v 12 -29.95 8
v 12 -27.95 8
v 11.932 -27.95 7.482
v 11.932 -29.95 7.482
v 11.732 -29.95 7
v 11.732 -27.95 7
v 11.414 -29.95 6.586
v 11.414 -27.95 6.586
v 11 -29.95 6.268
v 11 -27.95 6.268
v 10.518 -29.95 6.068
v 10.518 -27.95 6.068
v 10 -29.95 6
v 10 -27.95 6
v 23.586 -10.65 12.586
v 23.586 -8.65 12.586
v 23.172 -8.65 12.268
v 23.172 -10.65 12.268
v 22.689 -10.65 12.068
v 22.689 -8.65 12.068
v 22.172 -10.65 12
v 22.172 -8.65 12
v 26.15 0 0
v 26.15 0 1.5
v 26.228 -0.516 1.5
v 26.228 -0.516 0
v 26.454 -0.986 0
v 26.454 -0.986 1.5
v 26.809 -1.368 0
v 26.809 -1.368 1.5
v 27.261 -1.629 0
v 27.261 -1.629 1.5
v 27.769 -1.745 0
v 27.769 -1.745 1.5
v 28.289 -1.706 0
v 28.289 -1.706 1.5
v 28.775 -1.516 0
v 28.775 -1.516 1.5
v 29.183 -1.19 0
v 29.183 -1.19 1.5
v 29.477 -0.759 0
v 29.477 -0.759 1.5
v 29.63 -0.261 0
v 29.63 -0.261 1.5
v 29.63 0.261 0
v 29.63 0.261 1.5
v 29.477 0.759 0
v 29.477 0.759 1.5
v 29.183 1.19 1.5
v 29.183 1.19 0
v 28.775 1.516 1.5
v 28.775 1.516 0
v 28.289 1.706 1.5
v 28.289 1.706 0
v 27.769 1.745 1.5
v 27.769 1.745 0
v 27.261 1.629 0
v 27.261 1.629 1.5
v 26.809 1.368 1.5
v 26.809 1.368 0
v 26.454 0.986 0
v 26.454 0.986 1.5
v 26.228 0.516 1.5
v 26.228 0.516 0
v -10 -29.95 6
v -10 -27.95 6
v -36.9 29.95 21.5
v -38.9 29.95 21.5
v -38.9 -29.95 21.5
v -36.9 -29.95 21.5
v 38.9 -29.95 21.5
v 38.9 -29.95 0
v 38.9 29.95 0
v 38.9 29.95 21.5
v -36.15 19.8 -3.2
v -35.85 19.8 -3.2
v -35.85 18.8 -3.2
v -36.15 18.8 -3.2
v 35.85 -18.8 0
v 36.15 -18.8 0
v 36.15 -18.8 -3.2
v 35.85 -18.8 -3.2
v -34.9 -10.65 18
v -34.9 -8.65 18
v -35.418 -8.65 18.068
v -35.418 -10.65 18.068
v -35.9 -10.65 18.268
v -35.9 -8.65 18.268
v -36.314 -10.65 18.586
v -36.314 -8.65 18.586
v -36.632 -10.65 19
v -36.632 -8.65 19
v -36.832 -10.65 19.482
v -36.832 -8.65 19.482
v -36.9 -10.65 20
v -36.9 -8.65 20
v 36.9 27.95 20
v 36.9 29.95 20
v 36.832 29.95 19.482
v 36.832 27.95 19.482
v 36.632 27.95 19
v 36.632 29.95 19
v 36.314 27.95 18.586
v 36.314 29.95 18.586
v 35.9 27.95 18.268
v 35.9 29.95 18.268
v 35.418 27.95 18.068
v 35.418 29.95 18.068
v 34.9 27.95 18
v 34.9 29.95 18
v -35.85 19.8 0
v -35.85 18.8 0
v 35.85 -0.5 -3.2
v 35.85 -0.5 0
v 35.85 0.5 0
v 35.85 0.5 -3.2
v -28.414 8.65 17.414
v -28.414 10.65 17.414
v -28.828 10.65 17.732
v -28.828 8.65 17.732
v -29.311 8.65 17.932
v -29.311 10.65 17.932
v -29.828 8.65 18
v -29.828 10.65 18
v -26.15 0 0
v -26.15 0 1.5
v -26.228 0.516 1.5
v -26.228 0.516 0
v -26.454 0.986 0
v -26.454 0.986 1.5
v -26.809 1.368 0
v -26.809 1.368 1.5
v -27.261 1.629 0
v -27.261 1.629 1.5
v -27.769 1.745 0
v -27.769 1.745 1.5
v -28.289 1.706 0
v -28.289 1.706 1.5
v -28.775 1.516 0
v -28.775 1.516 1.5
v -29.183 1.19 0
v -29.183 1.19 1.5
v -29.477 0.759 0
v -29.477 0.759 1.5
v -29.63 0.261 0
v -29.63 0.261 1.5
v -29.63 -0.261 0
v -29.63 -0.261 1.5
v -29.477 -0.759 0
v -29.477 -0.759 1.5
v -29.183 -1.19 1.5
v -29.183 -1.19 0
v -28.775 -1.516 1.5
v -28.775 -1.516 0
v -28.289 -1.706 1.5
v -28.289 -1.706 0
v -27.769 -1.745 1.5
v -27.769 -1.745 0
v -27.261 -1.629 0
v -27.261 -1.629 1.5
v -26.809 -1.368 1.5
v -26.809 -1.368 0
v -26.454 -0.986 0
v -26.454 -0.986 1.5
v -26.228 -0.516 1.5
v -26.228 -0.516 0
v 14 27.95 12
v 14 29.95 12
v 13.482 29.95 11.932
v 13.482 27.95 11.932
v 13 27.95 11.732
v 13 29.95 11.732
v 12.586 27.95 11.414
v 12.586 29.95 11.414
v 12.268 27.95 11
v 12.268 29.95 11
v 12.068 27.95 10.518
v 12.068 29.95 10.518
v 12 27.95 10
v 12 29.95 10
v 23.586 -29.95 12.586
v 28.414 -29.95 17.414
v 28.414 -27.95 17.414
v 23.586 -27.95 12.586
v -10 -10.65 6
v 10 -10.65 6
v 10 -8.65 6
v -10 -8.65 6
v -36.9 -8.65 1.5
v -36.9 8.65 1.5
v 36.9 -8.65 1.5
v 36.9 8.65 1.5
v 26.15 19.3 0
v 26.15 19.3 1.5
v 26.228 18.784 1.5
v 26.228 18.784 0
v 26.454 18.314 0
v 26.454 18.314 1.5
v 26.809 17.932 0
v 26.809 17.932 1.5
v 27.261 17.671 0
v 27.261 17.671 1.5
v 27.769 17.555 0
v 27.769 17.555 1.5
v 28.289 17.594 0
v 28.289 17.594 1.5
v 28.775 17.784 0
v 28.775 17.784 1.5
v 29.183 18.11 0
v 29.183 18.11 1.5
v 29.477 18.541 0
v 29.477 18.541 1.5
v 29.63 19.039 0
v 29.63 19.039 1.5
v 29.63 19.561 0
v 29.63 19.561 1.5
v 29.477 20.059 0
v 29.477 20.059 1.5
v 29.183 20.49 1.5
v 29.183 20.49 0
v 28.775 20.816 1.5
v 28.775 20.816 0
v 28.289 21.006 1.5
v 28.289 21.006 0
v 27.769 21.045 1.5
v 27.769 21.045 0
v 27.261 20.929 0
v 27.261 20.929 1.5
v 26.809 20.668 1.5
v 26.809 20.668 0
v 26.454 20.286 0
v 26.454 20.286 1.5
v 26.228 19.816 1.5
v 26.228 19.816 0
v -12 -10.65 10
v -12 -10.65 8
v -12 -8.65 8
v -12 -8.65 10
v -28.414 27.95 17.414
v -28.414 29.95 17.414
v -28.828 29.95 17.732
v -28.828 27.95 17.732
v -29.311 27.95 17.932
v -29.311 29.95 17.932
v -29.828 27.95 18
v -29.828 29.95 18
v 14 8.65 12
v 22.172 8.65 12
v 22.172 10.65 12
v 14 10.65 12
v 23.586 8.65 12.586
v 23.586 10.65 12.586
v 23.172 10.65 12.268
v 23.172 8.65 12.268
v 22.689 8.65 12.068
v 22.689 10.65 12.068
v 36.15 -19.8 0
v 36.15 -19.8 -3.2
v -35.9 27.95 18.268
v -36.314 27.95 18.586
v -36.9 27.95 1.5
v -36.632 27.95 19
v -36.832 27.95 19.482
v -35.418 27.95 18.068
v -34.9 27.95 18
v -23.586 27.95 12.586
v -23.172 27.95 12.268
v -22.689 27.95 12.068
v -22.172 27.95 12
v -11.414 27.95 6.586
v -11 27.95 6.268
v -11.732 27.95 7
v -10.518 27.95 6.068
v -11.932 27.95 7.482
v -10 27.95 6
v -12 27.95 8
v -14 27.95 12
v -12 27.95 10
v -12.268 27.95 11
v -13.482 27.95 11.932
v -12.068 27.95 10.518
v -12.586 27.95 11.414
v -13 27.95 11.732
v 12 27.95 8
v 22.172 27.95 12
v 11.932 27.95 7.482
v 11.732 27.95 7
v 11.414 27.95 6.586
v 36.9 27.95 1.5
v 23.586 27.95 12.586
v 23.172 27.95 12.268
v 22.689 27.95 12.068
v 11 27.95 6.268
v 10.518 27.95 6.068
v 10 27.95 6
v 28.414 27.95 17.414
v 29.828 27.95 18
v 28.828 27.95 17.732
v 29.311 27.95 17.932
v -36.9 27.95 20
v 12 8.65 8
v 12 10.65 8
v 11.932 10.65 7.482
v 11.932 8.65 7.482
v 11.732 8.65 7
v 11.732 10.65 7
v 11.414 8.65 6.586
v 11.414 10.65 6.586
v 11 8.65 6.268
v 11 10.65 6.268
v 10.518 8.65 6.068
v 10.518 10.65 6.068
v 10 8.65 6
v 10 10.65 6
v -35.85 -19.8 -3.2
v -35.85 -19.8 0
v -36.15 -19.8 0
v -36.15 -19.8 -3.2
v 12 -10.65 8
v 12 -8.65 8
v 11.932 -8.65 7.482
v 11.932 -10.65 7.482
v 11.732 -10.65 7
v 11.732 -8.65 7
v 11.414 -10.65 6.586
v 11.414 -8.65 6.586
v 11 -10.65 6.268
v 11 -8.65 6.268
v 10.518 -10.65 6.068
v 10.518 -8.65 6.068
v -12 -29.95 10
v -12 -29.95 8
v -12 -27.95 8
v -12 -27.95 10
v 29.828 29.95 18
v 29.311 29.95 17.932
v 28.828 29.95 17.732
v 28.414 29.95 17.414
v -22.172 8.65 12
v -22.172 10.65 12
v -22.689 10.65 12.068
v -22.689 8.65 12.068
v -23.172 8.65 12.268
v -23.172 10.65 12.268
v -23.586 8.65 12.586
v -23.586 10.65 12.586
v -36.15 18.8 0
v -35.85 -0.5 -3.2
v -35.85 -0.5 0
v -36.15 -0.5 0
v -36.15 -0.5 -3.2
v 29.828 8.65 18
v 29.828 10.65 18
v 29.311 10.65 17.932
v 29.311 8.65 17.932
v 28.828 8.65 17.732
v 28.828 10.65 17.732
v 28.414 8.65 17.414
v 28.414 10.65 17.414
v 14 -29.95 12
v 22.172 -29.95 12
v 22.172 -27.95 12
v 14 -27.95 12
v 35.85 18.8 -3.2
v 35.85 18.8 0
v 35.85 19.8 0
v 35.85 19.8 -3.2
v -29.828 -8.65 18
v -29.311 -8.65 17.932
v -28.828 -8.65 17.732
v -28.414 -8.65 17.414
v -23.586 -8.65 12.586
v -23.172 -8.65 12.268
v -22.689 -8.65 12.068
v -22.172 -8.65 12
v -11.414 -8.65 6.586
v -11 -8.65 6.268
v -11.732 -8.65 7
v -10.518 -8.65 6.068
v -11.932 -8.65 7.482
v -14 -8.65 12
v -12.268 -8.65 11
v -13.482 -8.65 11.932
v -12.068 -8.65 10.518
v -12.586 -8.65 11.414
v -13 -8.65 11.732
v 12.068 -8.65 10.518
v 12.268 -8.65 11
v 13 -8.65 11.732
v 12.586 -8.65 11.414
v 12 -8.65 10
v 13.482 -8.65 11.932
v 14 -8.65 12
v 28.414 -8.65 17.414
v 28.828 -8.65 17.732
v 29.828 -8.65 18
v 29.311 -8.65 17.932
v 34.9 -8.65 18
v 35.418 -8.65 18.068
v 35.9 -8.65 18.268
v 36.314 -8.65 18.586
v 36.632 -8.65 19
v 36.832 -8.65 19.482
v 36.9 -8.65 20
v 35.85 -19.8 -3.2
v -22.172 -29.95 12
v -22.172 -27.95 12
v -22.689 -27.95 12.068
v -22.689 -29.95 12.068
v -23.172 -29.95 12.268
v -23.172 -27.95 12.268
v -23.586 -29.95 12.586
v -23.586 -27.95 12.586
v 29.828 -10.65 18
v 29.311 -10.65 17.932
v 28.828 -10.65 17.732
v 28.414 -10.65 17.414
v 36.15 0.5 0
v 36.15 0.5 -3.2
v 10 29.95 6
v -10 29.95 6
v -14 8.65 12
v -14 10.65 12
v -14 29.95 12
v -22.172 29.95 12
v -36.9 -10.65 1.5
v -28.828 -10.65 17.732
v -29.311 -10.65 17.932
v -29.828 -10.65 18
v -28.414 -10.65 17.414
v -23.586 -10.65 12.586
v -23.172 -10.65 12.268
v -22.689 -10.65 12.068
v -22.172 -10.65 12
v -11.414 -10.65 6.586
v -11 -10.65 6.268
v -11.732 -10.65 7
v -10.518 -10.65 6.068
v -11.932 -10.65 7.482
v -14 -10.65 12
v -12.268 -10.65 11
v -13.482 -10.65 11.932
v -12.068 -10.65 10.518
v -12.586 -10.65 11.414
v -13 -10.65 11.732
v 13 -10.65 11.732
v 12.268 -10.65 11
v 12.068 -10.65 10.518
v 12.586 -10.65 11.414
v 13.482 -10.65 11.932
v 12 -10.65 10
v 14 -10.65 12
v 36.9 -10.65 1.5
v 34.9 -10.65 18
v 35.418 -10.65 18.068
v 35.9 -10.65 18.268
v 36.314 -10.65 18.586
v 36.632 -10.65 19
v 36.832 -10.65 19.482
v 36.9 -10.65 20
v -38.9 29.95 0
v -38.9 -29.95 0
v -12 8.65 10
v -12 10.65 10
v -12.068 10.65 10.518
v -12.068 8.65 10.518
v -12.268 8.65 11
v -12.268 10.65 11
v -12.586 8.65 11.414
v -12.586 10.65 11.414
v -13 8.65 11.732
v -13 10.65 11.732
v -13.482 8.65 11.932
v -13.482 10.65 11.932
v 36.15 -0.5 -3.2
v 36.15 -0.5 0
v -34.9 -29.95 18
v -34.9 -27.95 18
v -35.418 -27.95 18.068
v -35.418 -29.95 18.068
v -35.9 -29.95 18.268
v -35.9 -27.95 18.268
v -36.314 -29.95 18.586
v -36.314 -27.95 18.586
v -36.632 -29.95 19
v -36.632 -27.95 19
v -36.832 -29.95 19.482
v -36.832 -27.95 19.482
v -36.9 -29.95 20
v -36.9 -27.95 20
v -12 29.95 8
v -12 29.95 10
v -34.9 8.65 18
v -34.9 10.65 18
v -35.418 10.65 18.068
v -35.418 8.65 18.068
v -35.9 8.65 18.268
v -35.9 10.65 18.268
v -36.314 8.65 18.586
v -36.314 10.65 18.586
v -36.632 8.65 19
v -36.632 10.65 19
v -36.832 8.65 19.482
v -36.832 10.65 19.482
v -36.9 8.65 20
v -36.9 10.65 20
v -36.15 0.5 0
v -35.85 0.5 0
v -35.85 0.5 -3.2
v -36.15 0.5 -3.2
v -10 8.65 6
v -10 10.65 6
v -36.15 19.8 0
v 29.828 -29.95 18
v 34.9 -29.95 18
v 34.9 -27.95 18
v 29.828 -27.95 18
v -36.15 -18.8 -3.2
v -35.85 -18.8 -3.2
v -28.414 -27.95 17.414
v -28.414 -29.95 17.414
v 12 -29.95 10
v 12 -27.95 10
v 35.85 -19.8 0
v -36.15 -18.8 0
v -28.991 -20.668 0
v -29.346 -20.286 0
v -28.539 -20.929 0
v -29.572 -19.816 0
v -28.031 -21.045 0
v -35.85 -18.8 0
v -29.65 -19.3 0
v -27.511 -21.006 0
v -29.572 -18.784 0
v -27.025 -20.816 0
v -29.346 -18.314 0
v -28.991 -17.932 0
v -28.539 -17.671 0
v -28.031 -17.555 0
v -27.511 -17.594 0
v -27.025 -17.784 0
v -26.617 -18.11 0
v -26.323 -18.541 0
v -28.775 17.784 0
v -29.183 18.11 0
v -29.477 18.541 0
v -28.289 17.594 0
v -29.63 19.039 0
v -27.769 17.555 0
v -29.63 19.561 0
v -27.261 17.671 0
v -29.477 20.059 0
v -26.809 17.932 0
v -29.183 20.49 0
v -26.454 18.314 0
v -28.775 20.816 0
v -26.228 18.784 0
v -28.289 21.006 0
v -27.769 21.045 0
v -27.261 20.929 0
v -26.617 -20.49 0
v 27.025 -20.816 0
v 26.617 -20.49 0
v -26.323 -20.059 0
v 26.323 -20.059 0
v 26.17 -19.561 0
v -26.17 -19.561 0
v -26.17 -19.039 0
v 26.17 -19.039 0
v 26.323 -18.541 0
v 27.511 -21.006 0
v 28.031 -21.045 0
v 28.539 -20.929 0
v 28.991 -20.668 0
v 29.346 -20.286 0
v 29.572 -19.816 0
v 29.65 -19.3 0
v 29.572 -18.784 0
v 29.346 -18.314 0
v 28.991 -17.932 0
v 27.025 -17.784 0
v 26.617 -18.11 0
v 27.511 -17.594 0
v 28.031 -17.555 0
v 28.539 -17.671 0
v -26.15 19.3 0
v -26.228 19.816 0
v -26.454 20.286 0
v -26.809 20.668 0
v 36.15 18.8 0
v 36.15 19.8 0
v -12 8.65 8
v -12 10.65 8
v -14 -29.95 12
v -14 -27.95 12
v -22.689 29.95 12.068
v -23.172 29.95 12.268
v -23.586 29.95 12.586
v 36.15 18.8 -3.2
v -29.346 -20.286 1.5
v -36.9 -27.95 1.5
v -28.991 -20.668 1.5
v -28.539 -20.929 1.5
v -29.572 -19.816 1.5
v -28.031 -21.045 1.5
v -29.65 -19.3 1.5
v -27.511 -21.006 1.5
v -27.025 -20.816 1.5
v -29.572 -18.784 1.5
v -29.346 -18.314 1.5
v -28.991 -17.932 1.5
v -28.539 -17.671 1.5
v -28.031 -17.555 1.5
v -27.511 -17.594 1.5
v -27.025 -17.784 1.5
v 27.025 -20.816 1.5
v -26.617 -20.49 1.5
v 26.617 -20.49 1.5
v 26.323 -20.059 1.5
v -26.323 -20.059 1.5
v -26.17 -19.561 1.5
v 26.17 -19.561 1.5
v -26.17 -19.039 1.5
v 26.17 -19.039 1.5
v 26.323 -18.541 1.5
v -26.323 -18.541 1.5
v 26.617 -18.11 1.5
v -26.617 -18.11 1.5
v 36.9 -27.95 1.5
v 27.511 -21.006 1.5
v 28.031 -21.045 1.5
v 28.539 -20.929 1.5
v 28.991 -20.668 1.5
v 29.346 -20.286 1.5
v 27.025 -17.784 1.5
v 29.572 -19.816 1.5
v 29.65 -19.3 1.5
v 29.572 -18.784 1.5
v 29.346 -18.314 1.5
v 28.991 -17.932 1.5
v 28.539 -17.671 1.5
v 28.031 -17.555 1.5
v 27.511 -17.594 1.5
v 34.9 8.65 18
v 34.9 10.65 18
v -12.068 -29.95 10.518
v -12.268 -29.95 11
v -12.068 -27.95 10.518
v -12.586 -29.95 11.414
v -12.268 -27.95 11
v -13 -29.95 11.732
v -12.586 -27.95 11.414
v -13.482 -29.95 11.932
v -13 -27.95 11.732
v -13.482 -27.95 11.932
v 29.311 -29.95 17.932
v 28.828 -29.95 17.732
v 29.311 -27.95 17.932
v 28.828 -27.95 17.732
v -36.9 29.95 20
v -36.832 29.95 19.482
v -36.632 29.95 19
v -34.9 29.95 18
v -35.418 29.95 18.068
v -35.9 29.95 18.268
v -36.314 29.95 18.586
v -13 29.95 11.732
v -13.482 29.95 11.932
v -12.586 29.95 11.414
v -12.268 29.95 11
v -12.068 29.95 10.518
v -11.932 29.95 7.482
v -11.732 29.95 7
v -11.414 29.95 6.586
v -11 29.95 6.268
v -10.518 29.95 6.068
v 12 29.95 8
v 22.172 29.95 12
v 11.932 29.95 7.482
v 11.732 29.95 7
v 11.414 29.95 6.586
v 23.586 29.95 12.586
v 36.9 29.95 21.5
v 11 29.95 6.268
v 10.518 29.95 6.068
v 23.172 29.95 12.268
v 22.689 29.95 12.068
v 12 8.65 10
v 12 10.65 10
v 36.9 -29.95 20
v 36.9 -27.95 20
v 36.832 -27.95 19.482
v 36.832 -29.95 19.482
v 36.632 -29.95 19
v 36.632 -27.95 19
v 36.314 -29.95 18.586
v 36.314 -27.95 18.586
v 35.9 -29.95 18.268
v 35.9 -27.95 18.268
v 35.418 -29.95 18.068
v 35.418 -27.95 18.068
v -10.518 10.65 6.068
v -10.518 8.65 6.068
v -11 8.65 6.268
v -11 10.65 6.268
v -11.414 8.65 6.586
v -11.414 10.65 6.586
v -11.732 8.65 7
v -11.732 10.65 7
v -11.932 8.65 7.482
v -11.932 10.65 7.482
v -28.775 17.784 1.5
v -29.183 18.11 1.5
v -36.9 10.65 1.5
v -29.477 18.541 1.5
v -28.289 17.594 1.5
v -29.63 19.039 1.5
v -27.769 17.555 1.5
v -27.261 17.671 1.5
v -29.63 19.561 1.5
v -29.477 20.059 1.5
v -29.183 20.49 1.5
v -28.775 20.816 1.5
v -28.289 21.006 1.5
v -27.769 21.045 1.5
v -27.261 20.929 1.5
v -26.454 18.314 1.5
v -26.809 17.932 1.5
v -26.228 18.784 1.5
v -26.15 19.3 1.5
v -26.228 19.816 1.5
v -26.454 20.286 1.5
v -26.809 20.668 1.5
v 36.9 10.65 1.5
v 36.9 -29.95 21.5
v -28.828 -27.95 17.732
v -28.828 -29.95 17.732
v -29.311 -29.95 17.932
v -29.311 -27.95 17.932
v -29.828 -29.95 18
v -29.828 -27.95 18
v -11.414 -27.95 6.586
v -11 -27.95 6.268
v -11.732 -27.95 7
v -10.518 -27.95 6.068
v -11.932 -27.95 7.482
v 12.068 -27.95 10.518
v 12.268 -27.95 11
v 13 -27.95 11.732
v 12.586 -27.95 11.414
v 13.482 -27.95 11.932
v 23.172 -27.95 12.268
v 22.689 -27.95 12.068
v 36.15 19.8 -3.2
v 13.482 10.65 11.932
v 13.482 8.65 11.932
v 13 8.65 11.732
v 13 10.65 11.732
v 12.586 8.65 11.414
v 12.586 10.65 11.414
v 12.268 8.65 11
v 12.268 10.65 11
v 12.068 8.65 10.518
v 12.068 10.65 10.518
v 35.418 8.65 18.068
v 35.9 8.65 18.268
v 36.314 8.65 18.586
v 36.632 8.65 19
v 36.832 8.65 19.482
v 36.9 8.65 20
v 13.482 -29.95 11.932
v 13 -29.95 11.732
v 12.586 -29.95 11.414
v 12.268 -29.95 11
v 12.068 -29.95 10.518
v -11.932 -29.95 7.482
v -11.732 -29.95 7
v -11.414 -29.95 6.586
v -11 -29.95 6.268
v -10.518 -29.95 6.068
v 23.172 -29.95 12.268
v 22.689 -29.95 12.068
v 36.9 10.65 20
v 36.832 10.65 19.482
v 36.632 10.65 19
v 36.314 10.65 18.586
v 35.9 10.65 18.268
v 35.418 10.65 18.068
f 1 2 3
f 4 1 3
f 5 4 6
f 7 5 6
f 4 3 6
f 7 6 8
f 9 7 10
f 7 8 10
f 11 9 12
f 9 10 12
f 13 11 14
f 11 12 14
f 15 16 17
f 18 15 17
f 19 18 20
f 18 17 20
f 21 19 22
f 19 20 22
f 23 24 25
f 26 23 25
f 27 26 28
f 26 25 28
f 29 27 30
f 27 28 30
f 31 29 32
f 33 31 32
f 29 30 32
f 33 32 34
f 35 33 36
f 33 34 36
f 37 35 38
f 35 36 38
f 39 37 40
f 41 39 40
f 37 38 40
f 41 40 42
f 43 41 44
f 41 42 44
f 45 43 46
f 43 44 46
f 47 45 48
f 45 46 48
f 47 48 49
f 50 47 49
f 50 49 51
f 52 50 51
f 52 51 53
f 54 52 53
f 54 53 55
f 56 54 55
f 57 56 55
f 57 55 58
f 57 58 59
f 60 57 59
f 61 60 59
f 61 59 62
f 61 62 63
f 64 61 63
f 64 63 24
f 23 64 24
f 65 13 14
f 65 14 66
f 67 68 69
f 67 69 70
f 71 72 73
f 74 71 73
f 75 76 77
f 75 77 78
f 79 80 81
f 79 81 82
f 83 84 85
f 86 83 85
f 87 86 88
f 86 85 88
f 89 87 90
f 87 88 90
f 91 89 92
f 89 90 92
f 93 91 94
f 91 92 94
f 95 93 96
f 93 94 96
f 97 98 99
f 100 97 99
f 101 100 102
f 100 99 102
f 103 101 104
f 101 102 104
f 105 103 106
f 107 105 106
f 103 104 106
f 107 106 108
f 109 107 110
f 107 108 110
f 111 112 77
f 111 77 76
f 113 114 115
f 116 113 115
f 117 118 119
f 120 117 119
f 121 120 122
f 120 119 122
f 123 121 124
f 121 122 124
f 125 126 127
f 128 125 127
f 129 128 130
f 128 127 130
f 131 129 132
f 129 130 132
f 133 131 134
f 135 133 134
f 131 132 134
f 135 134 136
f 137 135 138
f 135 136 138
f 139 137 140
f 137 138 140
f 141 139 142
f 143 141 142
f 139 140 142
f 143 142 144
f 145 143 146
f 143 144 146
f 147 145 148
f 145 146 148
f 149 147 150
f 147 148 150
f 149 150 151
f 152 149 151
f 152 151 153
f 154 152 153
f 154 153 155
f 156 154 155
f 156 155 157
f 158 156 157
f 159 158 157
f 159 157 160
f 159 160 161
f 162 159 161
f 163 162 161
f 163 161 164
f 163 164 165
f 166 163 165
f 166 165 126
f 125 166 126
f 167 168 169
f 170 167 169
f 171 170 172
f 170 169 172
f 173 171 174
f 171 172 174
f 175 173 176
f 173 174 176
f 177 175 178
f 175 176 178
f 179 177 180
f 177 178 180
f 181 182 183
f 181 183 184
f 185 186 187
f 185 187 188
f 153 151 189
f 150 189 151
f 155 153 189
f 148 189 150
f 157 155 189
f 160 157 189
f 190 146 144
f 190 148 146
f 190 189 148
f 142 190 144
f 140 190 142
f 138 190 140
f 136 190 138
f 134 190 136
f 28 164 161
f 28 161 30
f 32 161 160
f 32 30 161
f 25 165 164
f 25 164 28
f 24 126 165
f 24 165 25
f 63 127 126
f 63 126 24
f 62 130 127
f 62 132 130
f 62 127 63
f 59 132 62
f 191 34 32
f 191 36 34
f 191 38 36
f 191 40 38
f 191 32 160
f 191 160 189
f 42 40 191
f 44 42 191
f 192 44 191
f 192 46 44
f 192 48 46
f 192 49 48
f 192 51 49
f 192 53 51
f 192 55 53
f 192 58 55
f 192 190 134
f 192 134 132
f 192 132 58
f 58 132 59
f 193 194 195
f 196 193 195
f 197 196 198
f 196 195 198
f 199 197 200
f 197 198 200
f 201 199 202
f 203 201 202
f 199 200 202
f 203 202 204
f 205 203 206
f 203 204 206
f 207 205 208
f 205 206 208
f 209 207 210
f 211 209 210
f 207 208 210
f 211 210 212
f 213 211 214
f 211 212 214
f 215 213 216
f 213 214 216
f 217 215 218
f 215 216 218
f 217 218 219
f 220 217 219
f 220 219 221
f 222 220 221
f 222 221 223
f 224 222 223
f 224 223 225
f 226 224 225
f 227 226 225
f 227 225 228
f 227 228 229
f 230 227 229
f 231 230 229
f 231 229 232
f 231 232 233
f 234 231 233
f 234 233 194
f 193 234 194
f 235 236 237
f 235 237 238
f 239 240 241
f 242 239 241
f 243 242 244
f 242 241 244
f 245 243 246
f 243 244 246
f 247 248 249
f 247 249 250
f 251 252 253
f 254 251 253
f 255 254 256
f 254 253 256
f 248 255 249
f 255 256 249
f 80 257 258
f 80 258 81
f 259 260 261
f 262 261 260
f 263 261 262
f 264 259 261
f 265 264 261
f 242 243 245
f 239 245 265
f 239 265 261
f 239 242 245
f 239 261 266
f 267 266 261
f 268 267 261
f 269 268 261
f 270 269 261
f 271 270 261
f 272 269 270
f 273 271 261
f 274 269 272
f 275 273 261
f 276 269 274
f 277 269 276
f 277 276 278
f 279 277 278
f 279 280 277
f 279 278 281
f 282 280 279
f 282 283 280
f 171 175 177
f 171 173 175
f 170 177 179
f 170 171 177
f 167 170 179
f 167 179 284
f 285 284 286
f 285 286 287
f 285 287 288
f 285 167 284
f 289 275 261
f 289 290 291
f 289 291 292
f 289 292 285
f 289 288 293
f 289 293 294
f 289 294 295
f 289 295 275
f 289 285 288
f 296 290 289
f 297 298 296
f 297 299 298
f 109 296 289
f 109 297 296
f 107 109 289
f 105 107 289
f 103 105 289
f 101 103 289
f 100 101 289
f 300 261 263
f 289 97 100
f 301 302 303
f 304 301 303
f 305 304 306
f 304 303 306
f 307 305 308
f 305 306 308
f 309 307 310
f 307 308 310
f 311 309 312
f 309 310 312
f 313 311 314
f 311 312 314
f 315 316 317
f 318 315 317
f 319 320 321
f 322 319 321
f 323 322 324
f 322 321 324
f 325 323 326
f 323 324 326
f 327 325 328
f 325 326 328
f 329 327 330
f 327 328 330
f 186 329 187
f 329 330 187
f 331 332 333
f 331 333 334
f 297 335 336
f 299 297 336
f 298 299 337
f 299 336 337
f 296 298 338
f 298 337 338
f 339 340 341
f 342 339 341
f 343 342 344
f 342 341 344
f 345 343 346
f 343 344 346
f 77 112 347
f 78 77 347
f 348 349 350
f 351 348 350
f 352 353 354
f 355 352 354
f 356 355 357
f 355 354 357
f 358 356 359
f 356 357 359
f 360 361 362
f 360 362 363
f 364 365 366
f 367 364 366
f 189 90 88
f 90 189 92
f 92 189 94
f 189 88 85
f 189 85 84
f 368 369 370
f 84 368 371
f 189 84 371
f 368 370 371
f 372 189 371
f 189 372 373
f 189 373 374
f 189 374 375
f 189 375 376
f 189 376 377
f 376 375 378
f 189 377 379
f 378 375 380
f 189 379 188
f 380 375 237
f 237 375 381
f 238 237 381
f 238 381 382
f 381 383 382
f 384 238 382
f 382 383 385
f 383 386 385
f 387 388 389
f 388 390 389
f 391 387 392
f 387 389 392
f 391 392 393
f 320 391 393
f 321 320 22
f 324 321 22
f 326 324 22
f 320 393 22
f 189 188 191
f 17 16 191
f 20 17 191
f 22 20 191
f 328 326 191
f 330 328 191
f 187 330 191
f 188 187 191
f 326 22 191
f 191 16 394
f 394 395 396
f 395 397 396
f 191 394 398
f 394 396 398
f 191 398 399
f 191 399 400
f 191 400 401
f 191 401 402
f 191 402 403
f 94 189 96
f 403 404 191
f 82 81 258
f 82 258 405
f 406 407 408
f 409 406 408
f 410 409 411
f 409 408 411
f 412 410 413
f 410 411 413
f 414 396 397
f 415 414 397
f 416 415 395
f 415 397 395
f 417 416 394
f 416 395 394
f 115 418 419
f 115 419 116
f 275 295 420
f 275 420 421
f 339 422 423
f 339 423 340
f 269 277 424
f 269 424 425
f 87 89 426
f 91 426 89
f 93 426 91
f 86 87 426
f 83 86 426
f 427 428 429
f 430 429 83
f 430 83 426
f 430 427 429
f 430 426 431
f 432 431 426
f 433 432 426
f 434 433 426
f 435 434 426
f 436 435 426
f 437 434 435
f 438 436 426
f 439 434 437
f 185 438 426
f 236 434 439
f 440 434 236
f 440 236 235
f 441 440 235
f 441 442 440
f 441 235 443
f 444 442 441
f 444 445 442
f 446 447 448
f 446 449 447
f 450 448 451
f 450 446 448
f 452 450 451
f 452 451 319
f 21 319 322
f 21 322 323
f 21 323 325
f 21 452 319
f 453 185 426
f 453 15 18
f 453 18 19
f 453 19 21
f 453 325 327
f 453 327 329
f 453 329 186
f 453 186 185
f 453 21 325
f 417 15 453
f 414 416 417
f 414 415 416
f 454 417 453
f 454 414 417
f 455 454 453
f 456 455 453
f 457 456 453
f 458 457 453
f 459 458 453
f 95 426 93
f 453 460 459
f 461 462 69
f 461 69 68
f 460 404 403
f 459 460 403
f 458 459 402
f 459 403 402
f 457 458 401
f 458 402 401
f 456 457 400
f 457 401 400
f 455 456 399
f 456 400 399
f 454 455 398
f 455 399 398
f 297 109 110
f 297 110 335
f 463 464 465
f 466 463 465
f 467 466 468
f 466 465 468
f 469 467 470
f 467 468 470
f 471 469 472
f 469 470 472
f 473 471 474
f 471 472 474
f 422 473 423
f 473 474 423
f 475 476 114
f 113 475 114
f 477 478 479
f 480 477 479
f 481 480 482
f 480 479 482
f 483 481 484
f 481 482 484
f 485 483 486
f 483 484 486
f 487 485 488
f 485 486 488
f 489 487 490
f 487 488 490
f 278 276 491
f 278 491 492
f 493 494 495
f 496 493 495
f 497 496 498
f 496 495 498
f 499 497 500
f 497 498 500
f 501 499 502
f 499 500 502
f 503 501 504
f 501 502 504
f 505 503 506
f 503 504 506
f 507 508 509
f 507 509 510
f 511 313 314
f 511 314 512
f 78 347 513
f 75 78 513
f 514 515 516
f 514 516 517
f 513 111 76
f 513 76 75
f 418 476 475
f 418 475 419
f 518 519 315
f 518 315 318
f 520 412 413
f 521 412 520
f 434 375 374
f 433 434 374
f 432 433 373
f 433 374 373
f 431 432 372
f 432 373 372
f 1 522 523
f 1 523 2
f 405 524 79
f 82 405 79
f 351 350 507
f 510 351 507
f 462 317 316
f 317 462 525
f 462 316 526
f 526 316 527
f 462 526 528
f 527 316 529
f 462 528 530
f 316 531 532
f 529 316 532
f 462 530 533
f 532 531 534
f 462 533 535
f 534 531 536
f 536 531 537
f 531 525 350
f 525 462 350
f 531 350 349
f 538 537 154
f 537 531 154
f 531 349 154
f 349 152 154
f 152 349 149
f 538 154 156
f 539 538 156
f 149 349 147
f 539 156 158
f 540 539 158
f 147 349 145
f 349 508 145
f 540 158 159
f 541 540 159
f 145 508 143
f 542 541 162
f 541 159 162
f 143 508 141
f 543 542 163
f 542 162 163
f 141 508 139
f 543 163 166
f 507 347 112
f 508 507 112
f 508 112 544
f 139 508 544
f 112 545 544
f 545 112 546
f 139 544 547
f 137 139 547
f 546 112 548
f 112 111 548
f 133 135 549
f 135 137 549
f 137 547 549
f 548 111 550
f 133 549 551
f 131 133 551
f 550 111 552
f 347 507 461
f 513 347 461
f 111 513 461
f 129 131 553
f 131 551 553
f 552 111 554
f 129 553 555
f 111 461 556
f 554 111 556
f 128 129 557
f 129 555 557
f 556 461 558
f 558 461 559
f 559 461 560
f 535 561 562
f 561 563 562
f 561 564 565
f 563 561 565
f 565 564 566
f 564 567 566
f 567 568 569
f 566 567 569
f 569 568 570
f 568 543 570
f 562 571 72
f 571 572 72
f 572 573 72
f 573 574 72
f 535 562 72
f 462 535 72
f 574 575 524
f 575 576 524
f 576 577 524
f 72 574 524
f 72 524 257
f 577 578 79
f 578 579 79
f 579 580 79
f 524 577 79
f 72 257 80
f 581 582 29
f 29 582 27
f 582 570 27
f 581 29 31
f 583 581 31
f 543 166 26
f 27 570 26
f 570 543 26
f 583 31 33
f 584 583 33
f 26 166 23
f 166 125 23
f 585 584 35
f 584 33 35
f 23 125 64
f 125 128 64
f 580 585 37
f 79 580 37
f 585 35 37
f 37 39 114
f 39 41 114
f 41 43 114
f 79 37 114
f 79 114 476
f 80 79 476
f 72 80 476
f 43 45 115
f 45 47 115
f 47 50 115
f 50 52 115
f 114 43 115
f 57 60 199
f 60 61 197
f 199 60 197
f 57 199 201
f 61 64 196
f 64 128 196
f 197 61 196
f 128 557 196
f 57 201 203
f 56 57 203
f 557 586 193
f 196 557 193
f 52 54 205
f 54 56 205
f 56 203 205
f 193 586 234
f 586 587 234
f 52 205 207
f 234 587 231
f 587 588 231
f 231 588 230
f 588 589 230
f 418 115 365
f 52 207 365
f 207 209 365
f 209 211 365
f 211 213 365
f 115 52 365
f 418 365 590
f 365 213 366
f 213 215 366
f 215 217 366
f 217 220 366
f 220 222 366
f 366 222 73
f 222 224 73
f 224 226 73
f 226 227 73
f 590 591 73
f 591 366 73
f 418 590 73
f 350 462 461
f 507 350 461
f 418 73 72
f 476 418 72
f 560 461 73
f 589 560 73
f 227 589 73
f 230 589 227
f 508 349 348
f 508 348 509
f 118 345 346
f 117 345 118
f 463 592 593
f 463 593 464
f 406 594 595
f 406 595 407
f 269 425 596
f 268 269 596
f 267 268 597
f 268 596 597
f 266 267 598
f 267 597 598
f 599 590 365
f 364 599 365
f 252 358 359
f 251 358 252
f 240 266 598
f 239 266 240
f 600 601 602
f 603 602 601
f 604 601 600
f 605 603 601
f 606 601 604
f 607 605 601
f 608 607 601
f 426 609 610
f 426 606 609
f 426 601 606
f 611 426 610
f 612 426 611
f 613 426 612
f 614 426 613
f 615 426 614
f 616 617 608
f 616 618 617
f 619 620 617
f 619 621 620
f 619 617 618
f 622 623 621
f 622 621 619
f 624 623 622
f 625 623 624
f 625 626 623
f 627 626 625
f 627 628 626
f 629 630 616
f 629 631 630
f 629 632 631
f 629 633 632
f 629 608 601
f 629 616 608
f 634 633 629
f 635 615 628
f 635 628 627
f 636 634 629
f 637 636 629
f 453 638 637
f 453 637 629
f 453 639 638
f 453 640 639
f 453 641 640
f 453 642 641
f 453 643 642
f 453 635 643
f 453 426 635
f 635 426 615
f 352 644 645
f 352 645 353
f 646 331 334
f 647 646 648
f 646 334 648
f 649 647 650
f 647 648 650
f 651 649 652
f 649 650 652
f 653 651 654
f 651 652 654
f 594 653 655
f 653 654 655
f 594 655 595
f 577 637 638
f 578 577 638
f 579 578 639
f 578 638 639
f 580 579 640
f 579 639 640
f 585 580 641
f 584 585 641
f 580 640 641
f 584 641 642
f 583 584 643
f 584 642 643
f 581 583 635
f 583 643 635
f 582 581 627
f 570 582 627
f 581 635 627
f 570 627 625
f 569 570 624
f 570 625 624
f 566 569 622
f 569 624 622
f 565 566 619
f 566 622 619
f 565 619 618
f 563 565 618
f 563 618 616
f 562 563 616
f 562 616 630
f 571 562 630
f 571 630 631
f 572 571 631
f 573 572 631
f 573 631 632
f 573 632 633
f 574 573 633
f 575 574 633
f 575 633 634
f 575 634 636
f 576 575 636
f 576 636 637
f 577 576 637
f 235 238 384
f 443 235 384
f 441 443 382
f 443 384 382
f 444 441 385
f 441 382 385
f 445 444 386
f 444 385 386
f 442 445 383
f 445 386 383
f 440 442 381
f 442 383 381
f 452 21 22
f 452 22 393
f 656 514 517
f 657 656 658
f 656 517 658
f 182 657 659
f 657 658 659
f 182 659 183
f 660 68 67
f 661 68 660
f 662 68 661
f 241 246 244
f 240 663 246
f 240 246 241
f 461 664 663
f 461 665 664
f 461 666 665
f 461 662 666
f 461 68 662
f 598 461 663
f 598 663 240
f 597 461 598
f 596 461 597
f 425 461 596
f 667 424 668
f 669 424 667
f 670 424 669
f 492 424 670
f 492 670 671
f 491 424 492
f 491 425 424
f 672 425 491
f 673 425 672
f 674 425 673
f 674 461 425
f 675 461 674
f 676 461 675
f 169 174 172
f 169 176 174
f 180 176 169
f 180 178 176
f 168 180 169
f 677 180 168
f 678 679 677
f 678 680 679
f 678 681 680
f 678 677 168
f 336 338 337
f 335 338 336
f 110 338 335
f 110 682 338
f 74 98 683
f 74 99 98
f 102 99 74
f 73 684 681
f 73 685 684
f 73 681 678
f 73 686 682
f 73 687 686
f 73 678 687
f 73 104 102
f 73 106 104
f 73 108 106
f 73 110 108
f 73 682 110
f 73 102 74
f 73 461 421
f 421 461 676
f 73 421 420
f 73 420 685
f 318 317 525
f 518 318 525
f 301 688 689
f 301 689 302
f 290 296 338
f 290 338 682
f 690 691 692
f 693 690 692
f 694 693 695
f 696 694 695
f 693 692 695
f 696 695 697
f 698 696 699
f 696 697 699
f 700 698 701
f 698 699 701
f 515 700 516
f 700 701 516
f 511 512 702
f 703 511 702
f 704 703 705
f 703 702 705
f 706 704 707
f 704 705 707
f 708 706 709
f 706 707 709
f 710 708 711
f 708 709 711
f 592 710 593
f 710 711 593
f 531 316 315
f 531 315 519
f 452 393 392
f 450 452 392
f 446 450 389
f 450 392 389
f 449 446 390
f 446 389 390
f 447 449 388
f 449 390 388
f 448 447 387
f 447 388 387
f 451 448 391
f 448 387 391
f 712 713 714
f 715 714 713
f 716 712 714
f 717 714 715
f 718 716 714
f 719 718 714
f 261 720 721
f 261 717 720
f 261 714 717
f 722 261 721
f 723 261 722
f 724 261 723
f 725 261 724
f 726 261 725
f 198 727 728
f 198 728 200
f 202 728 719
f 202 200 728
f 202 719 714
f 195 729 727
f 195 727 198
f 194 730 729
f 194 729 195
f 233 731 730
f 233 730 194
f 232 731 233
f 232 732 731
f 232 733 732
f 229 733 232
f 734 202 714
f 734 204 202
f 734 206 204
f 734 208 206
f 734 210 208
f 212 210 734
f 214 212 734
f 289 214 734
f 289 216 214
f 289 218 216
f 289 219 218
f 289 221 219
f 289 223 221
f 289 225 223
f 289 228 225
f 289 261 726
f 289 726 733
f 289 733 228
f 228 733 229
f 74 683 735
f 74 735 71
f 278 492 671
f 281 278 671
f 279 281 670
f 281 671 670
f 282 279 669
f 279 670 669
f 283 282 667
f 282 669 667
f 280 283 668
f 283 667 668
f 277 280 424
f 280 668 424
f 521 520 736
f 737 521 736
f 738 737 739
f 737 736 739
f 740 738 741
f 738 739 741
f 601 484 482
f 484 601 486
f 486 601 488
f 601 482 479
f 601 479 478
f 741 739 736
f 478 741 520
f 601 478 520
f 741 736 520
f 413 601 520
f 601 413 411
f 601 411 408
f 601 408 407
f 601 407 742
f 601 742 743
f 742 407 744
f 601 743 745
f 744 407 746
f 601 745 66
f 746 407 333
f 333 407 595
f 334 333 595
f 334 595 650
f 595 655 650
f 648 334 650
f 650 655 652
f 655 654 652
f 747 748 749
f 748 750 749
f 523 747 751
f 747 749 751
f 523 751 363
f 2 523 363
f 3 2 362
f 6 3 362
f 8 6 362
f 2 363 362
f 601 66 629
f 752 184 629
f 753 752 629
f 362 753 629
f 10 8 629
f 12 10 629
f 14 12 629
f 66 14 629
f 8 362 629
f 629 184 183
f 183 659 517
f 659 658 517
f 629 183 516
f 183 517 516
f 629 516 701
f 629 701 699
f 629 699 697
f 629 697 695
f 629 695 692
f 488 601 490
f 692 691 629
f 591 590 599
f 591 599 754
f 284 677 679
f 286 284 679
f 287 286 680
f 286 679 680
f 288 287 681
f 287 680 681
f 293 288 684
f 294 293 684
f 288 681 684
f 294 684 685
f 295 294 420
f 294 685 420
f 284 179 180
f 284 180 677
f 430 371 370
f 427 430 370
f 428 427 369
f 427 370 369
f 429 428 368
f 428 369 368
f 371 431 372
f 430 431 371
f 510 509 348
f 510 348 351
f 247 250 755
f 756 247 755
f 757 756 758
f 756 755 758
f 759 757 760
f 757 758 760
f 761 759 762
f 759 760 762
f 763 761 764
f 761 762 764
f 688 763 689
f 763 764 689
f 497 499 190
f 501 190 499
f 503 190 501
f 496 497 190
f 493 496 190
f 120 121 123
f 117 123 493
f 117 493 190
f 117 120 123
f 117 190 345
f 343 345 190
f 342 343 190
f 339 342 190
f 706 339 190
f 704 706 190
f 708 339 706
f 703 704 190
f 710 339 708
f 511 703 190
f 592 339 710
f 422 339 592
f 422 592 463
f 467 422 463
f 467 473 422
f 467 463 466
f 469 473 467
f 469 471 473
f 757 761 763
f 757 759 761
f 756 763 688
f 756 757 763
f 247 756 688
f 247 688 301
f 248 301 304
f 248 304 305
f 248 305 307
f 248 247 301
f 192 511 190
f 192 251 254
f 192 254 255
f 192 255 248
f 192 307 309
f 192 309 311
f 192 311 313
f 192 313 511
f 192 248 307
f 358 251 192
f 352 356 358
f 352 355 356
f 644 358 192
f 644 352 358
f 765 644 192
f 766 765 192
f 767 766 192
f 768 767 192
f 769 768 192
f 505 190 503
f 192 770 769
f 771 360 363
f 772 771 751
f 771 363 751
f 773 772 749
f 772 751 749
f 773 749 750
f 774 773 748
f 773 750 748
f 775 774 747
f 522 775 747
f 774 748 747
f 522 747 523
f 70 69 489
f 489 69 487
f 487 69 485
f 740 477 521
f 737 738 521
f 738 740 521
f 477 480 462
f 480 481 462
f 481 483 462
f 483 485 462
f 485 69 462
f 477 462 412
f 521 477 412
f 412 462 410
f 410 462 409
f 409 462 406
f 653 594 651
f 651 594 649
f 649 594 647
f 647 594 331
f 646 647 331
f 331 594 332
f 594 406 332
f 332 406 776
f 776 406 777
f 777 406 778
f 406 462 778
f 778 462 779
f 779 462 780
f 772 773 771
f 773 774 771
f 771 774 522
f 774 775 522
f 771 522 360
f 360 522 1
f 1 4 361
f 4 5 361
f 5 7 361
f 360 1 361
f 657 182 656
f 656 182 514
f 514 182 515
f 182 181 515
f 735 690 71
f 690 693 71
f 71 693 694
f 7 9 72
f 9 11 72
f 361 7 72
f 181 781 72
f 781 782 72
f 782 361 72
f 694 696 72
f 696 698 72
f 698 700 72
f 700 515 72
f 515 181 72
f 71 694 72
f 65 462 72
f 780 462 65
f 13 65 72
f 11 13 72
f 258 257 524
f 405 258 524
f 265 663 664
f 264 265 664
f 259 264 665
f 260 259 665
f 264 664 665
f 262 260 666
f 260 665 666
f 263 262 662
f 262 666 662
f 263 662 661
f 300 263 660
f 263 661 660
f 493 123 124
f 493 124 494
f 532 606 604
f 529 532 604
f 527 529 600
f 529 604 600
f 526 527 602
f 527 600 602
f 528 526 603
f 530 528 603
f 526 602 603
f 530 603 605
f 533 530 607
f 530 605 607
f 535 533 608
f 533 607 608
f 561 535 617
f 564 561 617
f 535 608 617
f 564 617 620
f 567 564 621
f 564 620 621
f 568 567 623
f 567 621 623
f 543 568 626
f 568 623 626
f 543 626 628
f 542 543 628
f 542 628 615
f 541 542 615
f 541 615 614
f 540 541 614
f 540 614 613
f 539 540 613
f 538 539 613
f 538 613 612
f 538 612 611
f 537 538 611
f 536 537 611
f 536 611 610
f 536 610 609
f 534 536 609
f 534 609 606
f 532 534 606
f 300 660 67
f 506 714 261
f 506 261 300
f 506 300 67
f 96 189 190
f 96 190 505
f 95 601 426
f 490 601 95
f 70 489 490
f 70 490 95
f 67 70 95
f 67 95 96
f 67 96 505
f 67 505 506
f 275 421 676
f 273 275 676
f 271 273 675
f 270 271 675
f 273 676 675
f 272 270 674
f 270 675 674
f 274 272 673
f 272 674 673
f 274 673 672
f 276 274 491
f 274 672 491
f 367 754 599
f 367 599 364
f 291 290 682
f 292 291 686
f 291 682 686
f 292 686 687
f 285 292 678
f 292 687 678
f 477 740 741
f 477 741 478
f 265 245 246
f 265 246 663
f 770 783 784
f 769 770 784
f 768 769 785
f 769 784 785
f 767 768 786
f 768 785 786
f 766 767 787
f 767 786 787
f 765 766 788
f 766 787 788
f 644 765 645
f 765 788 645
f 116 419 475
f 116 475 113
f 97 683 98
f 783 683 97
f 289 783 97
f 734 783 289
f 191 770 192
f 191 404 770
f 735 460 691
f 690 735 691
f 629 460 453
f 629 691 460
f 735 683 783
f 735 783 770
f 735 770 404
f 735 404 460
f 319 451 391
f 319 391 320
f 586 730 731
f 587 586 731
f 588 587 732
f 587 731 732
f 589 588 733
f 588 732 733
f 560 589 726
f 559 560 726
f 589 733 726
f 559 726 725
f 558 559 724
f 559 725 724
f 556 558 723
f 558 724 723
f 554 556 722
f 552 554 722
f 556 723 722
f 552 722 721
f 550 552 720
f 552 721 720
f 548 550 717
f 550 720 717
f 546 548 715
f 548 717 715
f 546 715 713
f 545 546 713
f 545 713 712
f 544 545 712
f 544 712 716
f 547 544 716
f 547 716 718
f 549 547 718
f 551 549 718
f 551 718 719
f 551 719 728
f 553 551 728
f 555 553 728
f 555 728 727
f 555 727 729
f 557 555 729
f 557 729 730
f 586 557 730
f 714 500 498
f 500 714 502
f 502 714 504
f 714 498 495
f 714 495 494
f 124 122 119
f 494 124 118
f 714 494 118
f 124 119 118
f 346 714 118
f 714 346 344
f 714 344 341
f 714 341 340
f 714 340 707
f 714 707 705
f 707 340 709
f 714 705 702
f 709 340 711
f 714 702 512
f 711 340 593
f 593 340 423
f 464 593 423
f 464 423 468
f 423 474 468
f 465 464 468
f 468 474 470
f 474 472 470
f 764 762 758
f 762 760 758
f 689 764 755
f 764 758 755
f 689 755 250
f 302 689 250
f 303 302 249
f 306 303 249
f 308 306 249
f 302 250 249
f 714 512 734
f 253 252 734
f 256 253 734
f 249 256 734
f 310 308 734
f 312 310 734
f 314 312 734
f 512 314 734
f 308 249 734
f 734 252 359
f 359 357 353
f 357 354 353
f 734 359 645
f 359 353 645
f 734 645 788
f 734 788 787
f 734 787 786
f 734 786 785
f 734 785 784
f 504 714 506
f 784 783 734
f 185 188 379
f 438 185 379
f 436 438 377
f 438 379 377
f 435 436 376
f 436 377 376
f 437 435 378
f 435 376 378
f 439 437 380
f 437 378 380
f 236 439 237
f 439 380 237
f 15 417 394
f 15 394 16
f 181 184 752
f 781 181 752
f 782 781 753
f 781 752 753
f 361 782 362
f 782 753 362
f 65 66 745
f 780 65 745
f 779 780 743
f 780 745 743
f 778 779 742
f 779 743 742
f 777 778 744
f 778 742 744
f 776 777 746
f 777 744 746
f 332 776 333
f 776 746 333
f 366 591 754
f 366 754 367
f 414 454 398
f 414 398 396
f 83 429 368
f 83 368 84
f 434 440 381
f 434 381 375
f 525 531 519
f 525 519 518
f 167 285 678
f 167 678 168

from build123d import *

# Parameters (mm, degrees)
SKETCH1_W           = 77.8
SKETCH1_H           = 59.9
BOSS_EXTRUDE1_DEPTH = 21.5
CUT_EXTRUDE1_DEPTH  = 75.588672062
FILLET1_R           = 2
SKETCH4_W           = 73.8
SKETCH4_H           = 17.3
CUT_EXTRUDE2_DEPTH  = 20
SKETCH5_R           = 1.75
CUT_EXTRUDE3_DEPTH  = 54.011437445
SKETCH6_W           = 0.3
SKETCH6_H           = 1
BOSS_EXTRUDE2_DEPTH = 3.2


with BuildPart() as part:
    # Sketch1 → Boss-Extrude1 (new body)
    with BuildSketch(Plane.XY):
        Rectangle(SKETCH1_W, SKETCH1_H)
    extrude(amount=BOSS_EXTRUDE1_DEPTH)

    # Sketch2 → Cut-Extrude1 (cut, through all)
    with BuildSketch(Plane.XZ.offset(29.95)):
        Polygon((-36.9, 21.5), (36.9, 21.5), (36.9, 18), (29, 18), (23, 12), (12, 12), (12, 6), (-12, 6), (-12, 12), (-23, 12), (-29, 18), (-36.9, 18), align=None)
    extrude(amount=-CUT_EXTRUDE1_DEPTH, mode=Mode.SUBTRACT)

    # Fillet1
    fillet1_edges = [part.edges().sort_by_distance(p)[0] for p in [
        (-12, 0, 12),
        (-23, 0, 12),
        (-29, 0, 18),
        (-36.9, 0, 18),
        (36.9, 0, 18),
        (29, 0, 18),
        (23, 0, 12),
        (12, 0, 12),
        (12, 0, 6),
        (-12, 0, 6),
    ]]
    fillet(fillet1_edges, radius=FILLET1_R)

    # Sketch4 → Cut-Extrude2 (cut)
    with BuildSketch(Plane.XY.offset(21.5)):
        with Locations((0, 19.3)):
            Rectangle(SKETCH4_W, SKETCH4_H)
        Rectangle(SKETCH4_W, SKETCH4_H)
        with Locations((0, -19.3)):
            Rectangle(SKETCH4_W, SKETCH4_H)
    extrude(amount=-CUT_EXTRUDE2_DEPTH, mode=Mode.SUBTRACT)

    # Sketch5 → Cut-Extrude3 (cut, through all)
    with BuildSketch(Plane.XY.offset(1.5)):
        with Locations((-27.9, 0)):
            Circle(SKETCH5_R)
        with Locations((-27.9, 19.3)):
            Circle(SKETCH5_R)
        with Locations(Location((27.9, 0, 0), (0, 0, 180))):
            Circle(SKETCH5_R)
        with Locations(Location((27.9, 19.3, 0), (0, 0, 180))):
            Circle(SKETCH5_R)
        with Locations((27.9, -19.3)):
            Circle(SKETCH5_R)
        with Locations(Location((-27.9, -19.3, 0), (0, 0, 180))):
            Circle(SKETCH5_R)
    extrude(amount=-CUT_EXTRUDE3_DEPTH, mode=Mode.SUBTRACT)

    # Sketch6 → Boss-Extrude2 (add)
    with BuildSketch(Plane(origin=(0, 0, 0), x_dir=(-1, 0, 0), z_dir=(0, 0, -1))):
        with Locations((-36, 0)):
            Rectangle(SKETCH6_W, SKETCH6_H)
        with Locations((-36, 19.3)):
            Rectangle(SKETCH6_W, SKETCH6_H)
        with Locations((36, 19.3)):
            Rectangle(SKETCH6_W, SKETCH6_H)
        with Locations((36, 0)):
            Rectangle(SKETCH6_W, SKETCH6_H)
        with Locations((36, -19.3)):
            Rectangle(SKETCH6_W, SKETCH6_H)
        with Locations((-36, -19.3)):
            Rectangle(SKETCH6_W, SKETCH6_H)
    extrude(amount=BOSS_EXTRUDE2_DEPTH)


solid = part.part
